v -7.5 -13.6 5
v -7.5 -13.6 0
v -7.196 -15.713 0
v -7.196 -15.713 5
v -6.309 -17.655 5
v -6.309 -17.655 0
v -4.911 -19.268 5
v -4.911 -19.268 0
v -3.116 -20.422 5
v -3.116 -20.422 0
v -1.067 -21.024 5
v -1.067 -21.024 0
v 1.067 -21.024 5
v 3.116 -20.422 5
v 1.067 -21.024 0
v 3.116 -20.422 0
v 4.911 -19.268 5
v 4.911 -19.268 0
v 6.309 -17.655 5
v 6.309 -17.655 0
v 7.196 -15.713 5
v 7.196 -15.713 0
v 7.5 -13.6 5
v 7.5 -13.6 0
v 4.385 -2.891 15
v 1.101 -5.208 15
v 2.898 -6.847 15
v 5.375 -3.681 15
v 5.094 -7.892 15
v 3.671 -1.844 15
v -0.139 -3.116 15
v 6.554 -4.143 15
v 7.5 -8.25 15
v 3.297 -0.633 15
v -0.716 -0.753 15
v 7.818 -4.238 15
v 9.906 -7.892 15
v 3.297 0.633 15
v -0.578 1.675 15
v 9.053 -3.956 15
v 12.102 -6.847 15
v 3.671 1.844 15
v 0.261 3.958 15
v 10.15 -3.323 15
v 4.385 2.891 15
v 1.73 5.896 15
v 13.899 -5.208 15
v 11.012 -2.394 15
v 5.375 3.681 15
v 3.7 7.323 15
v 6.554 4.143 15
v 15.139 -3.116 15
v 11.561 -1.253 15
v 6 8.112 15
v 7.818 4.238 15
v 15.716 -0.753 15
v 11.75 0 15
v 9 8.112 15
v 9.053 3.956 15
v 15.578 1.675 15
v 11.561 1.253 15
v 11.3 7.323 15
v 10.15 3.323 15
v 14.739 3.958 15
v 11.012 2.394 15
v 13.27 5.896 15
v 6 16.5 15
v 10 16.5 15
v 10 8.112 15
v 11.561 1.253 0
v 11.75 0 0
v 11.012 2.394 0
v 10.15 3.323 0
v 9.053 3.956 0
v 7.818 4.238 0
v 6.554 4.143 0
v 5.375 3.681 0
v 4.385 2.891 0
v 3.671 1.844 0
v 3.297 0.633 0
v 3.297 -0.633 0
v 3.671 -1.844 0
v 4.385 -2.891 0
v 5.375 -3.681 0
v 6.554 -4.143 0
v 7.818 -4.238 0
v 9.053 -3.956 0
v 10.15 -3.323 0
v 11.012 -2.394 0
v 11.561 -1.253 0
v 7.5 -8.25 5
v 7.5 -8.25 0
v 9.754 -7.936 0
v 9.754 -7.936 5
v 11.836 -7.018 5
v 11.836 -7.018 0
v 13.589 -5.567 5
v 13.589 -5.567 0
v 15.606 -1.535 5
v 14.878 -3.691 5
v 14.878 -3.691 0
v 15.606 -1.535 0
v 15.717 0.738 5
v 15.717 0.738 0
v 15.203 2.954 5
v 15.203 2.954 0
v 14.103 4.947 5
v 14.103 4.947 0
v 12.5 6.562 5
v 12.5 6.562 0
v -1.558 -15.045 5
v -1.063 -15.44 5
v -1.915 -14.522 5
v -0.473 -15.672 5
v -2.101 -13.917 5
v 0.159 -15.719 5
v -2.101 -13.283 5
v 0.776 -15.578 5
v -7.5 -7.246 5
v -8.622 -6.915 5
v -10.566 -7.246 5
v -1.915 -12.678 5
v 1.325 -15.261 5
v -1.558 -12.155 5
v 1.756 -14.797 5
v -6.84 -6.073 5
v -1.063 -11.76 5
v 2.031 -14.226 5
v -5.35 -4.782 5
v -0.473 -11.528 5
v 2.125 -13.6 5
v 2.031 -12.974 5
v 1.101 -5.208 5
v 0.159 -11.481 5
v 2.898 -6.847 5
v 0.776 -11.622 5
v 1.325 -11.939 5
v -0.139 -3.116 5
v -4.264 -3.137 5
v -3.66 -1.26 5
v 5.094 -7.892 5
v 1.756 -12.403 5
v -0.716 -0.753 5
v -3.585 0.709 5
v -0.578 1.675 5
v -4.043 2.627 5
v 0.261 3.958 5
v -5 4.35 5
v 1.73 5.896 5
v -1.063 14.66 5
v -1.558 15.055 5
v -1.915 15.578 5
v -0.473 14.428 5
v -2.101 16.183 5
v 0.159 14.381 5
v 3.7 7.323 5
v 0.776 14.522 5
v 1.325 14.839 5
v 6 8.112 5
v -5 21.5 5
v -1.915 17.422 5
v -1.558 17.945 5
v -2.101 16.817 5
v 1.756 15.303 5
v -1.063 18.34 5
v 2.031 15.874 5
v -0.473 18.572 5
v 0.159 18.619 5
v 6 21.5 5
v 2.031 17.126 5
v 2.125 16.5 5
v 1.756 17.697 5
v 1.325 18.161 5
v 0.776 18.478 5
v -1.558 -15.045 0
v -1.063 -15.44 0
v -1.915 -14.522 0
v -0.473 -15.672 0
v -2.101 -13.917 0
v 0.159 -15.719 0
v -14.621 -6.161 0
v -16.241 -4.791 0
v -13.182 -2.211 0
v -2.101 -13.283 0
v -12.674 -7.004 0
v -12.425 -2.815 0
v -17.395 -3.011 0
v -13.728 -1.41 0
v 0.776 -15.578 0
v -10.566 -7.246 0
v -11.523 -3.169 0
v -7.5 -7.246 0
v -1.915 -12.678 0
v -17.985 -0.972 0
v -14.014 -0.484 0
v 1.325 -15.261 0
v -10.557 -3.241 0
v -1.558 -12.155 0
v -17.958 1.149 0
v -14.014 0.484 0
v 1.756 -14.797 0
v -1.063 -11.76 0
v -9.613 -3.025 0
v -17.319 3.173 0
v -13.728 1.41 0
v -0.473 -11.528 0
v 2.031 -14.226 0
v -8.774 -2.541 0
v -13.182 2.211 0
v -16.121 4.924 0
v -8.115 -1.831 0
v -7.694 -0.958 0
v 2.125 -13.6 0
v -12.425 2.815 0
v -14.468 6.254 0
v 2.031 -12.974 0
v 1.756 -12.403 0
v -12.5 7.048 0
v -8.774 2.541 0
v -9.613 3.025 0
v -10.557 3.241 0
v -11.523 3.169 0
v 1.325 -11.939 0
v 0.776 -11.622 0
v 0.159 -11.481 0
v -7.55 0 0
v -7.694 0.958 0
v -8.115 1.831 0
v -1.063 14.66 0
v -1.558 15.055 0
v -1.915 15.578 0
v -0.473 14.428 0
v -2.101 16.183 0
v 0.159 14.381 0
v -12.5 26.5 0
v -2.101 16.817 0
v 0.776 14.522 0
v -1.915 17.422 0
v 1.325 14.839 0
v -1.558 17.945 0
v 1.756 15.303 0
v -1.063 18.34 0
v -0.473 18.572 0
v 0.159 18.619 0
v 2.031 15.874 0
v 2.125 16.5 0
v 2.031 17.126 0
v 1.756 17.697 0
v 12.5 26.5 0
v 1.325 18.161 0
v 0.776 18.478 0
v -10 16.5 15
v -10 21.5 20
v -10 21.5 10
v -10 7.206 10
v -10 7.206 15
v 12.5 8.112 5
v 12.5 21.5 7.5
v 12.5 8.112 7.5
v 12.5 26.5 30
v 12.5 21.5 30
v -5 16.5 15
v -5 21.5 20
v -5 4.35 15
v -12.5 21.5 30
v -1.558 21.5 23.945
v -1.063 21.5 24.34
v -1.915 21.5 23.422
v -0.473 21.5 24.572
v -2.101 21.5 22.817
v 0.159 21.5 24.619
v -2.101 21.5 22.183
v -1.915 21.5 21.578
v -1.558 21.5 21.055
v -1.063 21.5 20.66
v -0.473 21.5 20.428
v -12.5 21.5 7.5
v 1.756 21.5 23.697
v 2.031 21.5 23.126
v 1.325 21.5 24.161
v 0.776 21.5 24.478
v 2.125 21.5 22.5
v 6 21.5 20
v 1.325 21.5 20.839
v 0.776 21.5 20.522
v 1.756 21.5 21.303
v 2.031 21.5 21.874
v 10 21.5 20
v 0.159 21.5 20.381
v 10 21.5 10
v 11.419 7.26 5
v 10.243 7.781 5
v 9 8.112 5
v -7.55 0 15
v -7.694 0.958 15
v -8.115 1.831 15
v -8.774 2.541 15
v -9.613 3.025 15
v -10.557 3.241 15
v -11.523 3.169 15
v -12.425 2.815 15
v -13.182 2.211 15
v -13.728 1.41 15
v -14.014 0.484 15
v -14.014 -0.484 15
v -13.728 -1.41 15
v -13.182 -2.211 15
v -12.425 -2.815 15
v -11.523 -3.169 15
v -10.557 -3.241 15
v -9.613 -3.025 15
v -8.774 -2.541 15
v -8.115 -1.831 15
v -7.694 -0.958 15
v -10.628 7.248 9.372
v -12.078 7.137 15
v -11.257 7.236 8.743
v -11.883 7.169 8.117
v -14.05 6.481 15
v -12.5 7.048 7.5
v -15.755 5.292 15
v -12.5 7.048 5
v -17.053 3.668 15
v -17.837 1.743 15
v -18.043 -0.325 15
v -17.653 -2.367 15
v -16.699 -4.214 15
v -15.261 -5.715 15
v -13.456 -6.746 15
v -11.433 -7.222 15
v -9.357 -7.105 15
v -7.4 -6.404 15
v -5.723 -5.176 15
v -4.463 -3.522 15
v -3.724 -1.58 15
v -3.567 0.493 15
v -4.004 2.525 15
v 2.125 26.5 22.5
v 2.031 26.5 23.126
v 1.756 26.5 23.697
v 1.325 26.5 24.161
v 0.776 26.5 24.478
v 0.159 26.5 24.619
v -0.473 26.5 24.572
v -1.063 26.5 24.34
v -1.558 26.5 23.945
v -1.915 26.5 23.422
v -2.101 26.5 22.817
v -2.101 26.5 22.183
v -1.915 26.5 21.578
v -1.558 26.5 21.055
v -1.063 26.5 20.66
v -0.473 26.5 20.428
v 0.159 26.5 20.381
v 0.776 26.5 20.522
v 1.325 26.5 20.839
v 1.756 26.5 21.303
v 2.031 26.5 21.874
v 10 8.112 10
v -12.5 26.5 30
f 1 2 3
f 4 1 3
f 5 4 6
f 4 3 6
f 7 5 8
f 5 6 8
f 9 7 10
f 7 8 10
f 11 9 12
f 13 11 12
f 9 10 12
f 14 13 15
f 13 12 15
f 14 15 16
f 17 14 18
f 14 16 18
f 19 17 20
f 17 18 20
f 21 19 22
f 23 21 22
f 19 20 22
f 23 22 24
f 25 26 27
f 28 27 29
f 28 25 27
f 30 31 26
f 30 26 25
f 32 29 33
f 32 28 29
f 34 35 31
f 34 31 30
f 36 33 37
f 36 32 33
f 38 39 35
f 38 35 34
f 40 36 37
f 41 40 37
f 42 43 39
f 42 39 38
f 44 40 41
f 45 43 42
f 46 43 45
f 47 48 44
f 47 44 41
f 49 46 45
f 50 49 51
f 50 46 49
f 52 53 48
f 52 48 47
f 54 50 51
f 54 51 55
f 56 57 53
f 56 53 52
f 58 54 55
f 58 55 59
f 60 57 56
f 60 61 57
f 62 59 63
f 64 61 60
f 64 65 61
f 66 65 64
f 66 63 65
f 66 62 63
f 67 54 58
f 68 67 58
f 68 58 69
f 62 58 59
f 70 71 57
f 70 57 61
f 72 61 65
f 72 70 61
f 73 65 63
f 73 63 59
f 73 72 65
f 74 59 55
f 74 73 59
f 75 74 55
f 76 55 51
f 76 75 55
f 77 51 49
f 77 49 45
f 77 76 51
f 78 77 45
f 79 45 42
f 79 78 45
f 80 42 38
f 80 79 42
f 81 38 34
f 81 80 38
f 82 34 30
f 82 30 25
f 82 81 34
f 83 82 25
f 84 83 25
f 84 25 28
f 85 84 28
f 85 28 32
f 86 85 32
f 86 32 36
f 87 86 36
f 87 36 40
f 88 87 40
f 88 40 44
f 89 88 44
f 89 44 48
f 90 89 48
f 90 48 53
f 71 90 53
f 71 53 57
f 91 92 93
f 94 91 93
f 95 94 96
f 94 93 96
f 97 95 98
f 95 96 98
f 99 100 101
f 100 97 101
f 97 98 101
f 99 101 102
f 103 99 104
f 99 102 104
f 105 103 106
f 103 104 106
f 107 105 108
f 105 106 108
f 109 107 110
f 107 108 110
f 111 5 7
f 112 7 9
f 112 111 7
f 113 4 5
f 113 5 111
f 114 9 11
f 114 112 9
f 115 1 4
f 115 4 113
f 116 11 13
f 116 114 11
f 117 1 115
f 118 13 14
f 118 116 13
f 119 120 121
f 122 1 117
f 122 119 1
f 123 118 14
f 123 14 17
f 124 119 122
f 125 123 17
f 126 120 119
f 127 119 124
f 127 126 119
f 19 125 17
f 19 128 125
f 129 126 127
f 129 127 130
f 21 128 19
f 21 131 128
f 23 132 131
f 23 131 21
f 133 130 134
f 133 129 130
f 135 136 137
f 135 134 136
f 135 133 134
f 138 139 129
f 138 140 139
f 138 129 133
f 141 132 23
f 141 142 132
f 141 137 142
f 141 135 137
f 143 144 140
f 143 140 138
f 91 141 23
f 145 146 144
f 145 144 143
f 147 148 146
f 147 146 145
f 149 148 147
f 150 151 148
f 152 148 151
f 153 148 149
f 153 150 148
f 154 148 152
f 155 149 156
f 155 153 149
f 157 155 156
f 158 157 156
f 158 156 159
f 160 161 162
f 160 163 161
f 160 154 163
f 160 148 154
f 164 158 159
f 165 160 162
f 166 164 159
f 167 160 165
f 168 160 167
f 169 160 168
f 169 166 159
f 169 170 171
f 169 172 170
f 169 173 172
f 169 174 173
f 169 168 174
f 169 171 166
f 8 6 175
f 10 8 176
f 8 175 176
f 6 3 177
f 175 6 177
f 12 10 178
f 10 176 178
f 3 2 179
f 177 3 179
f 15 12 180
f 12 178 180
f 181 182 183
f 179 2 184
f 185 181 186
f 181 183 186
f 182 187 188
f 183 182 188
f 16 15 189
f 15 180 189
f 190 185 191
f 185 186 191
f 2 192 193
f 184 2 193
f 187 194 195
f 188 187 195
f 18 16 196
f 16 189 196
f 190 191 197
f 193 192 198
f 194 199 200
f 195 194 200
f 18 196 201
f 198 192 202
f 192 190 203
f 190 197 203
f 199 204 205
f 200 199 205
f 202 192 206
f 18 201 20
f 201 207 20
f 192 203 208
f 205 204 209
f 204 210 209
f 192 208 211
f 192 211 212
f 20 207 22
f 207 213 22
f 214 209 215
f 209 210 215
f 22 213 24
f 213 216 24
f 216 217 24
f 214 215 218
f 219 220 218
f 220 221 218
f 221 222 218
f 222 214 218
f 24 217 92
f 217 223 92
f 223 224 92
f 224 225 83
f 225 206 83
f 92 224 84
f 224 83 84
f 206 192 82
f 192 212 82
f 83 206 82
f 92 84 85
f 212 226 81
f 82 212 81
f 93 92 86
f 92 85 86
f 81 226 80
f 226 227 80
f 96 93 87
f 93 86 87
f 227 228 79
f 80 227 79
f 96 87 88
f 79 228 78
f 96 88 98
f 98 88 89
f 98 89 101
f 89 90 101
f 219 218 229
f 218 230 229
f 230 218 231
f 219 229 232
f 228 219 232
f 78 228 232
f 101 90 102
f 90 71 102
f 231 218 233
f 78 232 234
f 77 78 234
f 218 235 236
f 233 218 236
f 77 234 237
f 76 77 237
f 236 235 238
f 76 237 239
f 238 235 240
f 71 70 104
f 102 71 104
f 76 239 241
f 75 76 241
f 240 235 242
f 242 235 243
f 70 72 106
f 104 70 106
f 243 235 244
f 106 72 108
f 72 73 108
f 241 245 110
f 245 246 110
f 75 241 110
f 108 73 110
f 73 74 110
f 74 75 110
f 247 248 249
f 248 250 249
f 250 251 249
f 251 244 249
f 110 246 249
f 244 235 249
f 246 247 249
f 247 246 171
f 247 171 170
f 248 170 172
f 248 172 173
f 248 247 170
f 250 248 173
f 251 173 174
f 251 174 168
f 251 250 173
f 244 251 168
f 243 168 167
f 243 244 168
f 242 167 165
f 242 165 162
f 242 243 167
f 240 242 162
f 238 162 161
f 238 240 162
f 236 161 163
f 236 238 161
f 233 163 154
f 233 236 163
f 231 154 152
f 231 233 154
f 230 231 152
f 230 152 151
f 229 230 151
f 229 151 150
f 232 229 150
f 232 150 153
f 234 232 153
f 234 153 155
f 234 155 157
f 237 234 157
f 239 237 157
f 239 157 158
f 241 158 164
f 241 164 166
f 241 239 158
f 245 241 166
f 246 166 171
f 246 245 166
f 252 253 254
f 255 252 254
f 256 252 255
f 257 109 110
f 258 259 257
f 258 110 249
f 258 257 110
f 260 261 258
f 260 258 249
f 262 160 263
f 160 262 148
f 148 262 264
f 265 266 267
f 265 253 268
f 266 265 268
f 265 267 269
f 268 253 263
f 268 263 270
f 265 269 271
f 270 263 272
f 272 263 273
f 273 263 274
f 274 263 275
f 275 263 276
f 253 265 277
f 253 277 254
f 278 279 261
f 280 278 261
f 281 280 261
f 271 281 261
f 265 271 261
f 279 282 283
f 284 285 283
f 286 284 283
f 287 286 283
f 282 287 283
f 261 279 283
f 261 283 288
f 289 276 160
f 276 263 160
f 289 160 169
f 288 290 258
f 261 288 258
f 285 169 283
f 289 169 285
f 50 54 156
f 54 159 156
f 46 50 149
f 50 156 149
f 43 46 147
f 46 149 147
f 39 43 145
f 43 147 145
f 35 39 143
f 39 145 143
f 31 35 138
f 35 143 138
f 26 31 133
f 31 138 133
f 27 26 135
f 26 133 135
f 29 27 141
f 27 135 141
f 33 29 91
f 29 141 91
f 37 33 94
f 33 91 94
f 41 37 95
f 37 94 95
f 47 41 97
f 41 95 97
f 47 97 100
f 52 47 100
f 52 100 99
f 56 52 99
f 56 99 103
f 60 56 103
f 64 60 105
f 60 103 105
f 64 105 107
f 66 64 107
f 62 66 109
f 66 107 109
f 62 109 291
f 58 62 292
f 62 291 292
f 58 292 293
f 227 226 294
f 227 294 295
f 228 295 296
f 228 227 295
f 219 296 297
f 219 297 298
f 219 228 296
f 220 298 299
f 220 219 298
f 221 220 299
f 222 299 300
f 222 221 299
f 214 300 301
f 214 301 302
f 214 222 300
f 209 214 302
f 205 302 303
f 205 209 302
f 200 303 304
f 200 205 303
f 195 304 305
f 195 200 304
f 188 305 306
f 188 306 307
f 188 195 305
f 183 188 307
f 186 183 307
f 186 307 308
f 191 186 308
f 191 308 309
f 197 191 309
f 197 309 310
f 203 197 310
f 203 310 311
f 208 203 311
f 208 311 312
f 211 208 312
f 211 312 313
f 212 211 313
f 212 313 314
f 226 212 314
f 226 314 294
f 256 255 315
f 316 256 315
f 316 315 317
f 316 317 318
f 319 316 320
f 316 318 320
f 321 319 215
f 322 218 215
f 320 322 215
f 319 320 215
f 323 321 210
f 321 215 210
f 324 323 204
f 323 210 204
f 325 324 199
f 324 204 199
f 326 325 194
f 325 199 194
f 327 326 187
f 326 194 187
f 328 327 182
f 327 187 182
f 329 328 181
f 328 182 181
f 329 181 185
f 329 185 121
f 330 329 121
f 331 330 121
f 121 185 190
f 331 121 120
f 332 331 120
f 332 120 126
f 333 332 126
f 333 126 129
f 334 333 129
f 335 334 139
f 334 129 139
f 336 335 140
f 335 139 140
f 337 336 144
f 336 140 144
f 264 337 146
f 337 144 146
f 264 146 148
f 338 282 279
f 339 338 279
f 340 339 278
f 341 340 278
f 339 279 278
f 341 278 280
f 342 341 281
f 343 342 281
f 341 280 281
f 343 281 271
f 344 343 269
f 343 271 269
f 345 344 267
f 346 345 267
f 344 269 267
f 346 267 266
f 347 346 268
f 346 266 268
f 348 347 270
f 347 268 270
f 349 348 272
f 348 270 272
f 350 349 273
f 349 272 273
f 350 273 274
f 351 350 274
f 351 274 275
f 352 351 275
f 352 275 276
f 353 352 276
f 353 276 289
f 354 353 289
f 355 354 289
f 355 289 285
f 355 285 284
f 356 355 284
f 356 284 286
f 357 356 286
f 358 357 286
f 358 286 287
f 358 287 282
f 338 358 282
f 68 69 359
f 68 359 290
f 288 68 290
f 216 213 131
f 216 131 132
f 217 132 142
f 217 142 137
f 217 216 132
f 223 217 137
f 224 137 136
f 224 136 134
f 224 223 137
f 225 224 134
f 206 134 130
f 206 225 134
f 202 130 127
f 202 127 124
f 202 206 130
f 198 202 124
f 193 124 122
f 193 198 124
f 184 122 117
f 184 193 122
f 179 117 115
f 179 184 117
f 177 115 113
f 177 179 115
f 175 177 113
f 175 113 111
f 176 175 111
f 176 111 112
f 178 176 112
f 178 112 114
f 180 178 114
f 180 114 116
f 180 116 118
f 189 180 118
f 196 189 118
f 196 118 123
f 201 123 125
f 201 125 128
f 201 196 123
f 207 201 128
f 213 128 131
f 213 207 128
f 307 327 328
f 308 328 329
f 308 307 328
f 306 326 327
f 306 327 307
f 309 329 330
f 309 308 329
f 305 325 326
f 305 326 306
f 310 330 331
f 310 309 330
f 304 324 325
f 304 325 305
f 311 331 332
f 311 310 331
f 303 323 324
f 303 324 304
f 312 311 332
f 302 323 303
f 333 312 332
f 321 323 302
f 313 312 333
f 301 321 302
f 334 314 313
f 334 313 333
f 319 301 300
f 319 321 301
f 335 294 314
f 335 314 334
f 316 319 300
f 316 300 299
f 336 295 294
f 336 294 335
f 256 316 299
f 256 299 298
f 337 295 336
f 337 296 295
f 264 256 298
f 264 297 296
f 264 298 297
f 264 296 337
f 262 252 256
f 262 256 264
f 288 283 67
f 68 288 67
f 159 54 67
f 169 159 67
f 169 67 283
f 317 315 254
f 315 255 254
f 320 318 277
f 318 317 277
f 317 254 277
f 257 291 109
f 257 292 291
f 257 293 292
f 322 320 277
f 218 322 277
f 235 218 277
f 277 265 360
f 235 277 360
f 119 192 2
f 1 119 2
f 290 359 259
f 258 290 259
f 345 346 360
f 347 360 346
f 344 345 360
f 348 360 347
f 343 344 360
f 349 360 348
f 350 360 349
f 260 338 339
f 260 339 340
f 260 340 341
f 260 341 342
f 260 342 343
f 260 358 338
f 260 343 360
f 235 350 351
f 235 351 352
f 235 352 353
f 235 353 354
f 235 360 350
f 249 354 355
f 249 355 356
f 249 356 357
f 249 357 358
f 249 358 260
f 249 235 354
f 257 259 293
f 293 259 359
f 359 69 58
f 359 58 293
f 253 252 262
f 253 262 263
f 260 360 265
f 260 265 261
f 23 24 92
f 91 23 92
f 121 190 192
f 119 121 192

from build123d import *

# Parameters (mm, degrees)
F0_R          = 3.25
F0_R_2        = 2.125
F0_R_3        = 4.25
F1_DEPTH      = 5
F2_W          = 25
F2_H          = 5
F3_DEPTH      = 25
F4_R          = 7.25
F4_R_2        = 3.25
F4_R_3        = 8.25
F4_R_4        = 4.25
F5_DEPTH      = 10
F6_R          = 2.125
F7_DEPTH      = 5.001
F8_W          = 5
F8_H          = 17.15
F8_W_2        = 4
F8_H_2        = 13.3875096302
F9_DEPTH      = 10
F10_T1_DEPTH  = 5
F10_T3_DEPTH  = 4
F10_T8_DEPTH  = 30.7168298797
F10_T13_DEPTH = 29.7168298797
F10_T18_DEPTH = 27.1526880508
F10_S20_R     = 3.25
F10_T21_DEPTH = 16
F10_T25_DEPTH = 13.3875096302


# Not quite as in the source:
# - a fillet or chamfer that OpenCascade refuses, or shapes differently, is made with other operations: its cross-section is extruded or revolved along the edge and cut away or added


with BuildPart() as f1:
    # F0 (on Top) → F1 (new body)
    with BuildSketch(Plane.XY):
        with BuildLine():
            Line((12.5, 26.5), (0, 26.5))
            Line((0, 26.5), (-12.5, 26.5))
            Line((-12.5, 26.5), (-12.5, 7.0478720193))
            ThreePointArc((-12.5, 7.0478720193), (-17.9845104515, -0.9722703187), (-10.5656007648, -7.2462098368))
            Line((-10.5656007648, -7.2462098368), (-7.5, -7.2462098368))
            Line((-7.5, -7.2462098368), (-7.5, -13.6))
            ThreePointArc((-7.5, -13.6), (-5.3033008589, -18.9033008589), (0, -21.1))
            ThreePointArc((0, -21.1), (5.3033008589, -18.9033008589), (7.5, -13.6))
            Line((7.5, -13.6), (7.5, -8.25))
            ThreePointArc((7.5, -8.25), (15.3166703137, -2.6385915194), (12.5, 6.5622023742))
            Line((12.5, 6.5622023742), (12.5, 26.5))
        make_face()
        with Locations((-10.8, 0)):
            Circle(F0_R, mode=Mode.SUBTRACT)
        with Locations((0, -13.6)):
            Circle(F0_R_2, mode=Mode.SUBTRACT)
        with Locations((7.5, 0)):
            Circle(F0_R_3, mode=Mode.SUBTRACT)
        with Locations((0, 16.5)):
            Circle(F0_R_2, mode=Mode.SUBTRACT)
    extrude(amount=F1_DEPTH)

    # F2 (on face) → F3 (join)
    with BuildSketch(Plane.XY.offset(5)):
        with Locations((0, 24)):
            Rectangle(F2_W, F2_H)
    extrude(amount=F3_DEPTH)

    # F4 (on face) → F5 (join)
    with BuildSketch(Plane.XY.offset(5)):
        with Locations((-10.8, 0)):
            Circle(F4_R)
        with Locations((-10.8, 0)):
            Circle(F4_R_2, mode=Mode.SUBTRACT)
        with Locations((7.5, 0)):
            Circle(F4_R_3)
        with Locations((7.5, 0)):
            Circle(F4_R_4, mode=Mode.SUBTRACT)
    extrude(amount=F5_DEPTH)

    # F6 (on face) → F7 (cut, through all)
    with BuildSketch(Plane.XZ.offset(-21.5)):
        with Locations((0, 22.5)):
            Circle(F6_R)
    extrude(amount=-F7_DEPTH, mode=Mode.SUBTRACT)

    # F8 (on face) → F9 (join)
    with BuildSketch(Plane.XY.offset(5)):
        with Locations((-7.5, 12.925)):
            Rectangle(F8_W, F8_H)
        with Locations((8, 14.8062451849)):
            Rectangle(F8_W_2, F8_H_2)
    extrude(amount=F9_DEPTH)

    # F10: chamfer of 5 on 4 edges, made by hand

    # F10_s2 → F10_t1 (join)
    with BuildSketch(Plane.YZ.offset(-10)):
        Polygon((16.5, 15), (21.5, 20), (21.5, 15), align=None)
    extrude(amount=F10_T1_DEPTH)

    # F10_s4 → F10_t3 (join)
    with BuildSketch(Plane.YZ.offset(6)):
        Polygon((21.5, 20), (16.5, 15), (21.5, 15), align=None)
    extrude(amount=F10_T3_DEPTH)


with BuildPart() as f10_tool6:
    # F10_s7 → F10_t8 (new body)
    with BuildSketch(Plane.YZ.offset(7.8584149398)):
        Polygon((16.5, 15), (21.5, 20), (21.5, 15), align=None)
    extrude(amount=-F10_T8_DEPTH)

    split(bisect_by=Plane.YZ.offset(6), keep=Keep.TOP)


with BuildPart() as f1_1:
    add(f1.part)

    # F10_t5: union F10_tool6
    add(f10_tool6.part)


with BuildPart() as f10_tool11:
    # F10_s12 → F10_t13 (new body)
    with BuildSketch(Plane.YZ.offset(22.8584149398)):
        Polygon((21.5, 20), (16.5, 15), (21.5, 15), align=None)
    extrude(amount=-F10_T13_DEPTH)

    split(bisect_by=Plane.YZ.offset(-5), keep=Keep.BOTTOM)


with BuildPart() as f1_2:
    add(f1_1.part)

    # F10_t10: union F10_tool11
    add(f10_tool11.part)


with BuildPart() as f10_tool16:
    # F10_s17 → F10_t18 (new body)
    with BuildSketch(Plane.XZ.offset(-21.5)):
        Polygon((-10, 10), (-15, 5), (-10, 5), align=None)
    extrude(amount=F10_T18_DEPTH)

    split(bisect_by=Plane.YZ.offset(-12.5), keep=Keep.TOP)

    # F10_s20 → F10_t21 (cut, symmetric)
    with BuildSketch(Plane.XY.offset(7.5)):
        with Locations((-10.8, 0)):
            Circle(F10_S20_R)
    extrude(amount=F10_T21_DEPTH, both=True, mode=Mode.SUBTRACT)


with BuildPart() as f1_3:
    add(f1_2.part)

    # F10_t15: union F10_tool16
    add(f10_tool16.part)


with BuildPart() as f10_tool23:
    # F10_s24 → F10_t25 (new body)
    with BuildSketch(Plane.XZ.offset(-8.1124903698)):
        Polygon((10, 10), (15, 5), (10, 5), align=None)
    extrude(amount=-F10_T25_DEPTH)

    split(bisect_by=Plane.YZ.offset(12.5), keep=Keep.BOTTOM)


with BuildPart() as f1_4:
    add(f1_3.part)

    # F10_t22: union F10_tool23
    add(f10_tool23.part)


solid = f1_4.part
